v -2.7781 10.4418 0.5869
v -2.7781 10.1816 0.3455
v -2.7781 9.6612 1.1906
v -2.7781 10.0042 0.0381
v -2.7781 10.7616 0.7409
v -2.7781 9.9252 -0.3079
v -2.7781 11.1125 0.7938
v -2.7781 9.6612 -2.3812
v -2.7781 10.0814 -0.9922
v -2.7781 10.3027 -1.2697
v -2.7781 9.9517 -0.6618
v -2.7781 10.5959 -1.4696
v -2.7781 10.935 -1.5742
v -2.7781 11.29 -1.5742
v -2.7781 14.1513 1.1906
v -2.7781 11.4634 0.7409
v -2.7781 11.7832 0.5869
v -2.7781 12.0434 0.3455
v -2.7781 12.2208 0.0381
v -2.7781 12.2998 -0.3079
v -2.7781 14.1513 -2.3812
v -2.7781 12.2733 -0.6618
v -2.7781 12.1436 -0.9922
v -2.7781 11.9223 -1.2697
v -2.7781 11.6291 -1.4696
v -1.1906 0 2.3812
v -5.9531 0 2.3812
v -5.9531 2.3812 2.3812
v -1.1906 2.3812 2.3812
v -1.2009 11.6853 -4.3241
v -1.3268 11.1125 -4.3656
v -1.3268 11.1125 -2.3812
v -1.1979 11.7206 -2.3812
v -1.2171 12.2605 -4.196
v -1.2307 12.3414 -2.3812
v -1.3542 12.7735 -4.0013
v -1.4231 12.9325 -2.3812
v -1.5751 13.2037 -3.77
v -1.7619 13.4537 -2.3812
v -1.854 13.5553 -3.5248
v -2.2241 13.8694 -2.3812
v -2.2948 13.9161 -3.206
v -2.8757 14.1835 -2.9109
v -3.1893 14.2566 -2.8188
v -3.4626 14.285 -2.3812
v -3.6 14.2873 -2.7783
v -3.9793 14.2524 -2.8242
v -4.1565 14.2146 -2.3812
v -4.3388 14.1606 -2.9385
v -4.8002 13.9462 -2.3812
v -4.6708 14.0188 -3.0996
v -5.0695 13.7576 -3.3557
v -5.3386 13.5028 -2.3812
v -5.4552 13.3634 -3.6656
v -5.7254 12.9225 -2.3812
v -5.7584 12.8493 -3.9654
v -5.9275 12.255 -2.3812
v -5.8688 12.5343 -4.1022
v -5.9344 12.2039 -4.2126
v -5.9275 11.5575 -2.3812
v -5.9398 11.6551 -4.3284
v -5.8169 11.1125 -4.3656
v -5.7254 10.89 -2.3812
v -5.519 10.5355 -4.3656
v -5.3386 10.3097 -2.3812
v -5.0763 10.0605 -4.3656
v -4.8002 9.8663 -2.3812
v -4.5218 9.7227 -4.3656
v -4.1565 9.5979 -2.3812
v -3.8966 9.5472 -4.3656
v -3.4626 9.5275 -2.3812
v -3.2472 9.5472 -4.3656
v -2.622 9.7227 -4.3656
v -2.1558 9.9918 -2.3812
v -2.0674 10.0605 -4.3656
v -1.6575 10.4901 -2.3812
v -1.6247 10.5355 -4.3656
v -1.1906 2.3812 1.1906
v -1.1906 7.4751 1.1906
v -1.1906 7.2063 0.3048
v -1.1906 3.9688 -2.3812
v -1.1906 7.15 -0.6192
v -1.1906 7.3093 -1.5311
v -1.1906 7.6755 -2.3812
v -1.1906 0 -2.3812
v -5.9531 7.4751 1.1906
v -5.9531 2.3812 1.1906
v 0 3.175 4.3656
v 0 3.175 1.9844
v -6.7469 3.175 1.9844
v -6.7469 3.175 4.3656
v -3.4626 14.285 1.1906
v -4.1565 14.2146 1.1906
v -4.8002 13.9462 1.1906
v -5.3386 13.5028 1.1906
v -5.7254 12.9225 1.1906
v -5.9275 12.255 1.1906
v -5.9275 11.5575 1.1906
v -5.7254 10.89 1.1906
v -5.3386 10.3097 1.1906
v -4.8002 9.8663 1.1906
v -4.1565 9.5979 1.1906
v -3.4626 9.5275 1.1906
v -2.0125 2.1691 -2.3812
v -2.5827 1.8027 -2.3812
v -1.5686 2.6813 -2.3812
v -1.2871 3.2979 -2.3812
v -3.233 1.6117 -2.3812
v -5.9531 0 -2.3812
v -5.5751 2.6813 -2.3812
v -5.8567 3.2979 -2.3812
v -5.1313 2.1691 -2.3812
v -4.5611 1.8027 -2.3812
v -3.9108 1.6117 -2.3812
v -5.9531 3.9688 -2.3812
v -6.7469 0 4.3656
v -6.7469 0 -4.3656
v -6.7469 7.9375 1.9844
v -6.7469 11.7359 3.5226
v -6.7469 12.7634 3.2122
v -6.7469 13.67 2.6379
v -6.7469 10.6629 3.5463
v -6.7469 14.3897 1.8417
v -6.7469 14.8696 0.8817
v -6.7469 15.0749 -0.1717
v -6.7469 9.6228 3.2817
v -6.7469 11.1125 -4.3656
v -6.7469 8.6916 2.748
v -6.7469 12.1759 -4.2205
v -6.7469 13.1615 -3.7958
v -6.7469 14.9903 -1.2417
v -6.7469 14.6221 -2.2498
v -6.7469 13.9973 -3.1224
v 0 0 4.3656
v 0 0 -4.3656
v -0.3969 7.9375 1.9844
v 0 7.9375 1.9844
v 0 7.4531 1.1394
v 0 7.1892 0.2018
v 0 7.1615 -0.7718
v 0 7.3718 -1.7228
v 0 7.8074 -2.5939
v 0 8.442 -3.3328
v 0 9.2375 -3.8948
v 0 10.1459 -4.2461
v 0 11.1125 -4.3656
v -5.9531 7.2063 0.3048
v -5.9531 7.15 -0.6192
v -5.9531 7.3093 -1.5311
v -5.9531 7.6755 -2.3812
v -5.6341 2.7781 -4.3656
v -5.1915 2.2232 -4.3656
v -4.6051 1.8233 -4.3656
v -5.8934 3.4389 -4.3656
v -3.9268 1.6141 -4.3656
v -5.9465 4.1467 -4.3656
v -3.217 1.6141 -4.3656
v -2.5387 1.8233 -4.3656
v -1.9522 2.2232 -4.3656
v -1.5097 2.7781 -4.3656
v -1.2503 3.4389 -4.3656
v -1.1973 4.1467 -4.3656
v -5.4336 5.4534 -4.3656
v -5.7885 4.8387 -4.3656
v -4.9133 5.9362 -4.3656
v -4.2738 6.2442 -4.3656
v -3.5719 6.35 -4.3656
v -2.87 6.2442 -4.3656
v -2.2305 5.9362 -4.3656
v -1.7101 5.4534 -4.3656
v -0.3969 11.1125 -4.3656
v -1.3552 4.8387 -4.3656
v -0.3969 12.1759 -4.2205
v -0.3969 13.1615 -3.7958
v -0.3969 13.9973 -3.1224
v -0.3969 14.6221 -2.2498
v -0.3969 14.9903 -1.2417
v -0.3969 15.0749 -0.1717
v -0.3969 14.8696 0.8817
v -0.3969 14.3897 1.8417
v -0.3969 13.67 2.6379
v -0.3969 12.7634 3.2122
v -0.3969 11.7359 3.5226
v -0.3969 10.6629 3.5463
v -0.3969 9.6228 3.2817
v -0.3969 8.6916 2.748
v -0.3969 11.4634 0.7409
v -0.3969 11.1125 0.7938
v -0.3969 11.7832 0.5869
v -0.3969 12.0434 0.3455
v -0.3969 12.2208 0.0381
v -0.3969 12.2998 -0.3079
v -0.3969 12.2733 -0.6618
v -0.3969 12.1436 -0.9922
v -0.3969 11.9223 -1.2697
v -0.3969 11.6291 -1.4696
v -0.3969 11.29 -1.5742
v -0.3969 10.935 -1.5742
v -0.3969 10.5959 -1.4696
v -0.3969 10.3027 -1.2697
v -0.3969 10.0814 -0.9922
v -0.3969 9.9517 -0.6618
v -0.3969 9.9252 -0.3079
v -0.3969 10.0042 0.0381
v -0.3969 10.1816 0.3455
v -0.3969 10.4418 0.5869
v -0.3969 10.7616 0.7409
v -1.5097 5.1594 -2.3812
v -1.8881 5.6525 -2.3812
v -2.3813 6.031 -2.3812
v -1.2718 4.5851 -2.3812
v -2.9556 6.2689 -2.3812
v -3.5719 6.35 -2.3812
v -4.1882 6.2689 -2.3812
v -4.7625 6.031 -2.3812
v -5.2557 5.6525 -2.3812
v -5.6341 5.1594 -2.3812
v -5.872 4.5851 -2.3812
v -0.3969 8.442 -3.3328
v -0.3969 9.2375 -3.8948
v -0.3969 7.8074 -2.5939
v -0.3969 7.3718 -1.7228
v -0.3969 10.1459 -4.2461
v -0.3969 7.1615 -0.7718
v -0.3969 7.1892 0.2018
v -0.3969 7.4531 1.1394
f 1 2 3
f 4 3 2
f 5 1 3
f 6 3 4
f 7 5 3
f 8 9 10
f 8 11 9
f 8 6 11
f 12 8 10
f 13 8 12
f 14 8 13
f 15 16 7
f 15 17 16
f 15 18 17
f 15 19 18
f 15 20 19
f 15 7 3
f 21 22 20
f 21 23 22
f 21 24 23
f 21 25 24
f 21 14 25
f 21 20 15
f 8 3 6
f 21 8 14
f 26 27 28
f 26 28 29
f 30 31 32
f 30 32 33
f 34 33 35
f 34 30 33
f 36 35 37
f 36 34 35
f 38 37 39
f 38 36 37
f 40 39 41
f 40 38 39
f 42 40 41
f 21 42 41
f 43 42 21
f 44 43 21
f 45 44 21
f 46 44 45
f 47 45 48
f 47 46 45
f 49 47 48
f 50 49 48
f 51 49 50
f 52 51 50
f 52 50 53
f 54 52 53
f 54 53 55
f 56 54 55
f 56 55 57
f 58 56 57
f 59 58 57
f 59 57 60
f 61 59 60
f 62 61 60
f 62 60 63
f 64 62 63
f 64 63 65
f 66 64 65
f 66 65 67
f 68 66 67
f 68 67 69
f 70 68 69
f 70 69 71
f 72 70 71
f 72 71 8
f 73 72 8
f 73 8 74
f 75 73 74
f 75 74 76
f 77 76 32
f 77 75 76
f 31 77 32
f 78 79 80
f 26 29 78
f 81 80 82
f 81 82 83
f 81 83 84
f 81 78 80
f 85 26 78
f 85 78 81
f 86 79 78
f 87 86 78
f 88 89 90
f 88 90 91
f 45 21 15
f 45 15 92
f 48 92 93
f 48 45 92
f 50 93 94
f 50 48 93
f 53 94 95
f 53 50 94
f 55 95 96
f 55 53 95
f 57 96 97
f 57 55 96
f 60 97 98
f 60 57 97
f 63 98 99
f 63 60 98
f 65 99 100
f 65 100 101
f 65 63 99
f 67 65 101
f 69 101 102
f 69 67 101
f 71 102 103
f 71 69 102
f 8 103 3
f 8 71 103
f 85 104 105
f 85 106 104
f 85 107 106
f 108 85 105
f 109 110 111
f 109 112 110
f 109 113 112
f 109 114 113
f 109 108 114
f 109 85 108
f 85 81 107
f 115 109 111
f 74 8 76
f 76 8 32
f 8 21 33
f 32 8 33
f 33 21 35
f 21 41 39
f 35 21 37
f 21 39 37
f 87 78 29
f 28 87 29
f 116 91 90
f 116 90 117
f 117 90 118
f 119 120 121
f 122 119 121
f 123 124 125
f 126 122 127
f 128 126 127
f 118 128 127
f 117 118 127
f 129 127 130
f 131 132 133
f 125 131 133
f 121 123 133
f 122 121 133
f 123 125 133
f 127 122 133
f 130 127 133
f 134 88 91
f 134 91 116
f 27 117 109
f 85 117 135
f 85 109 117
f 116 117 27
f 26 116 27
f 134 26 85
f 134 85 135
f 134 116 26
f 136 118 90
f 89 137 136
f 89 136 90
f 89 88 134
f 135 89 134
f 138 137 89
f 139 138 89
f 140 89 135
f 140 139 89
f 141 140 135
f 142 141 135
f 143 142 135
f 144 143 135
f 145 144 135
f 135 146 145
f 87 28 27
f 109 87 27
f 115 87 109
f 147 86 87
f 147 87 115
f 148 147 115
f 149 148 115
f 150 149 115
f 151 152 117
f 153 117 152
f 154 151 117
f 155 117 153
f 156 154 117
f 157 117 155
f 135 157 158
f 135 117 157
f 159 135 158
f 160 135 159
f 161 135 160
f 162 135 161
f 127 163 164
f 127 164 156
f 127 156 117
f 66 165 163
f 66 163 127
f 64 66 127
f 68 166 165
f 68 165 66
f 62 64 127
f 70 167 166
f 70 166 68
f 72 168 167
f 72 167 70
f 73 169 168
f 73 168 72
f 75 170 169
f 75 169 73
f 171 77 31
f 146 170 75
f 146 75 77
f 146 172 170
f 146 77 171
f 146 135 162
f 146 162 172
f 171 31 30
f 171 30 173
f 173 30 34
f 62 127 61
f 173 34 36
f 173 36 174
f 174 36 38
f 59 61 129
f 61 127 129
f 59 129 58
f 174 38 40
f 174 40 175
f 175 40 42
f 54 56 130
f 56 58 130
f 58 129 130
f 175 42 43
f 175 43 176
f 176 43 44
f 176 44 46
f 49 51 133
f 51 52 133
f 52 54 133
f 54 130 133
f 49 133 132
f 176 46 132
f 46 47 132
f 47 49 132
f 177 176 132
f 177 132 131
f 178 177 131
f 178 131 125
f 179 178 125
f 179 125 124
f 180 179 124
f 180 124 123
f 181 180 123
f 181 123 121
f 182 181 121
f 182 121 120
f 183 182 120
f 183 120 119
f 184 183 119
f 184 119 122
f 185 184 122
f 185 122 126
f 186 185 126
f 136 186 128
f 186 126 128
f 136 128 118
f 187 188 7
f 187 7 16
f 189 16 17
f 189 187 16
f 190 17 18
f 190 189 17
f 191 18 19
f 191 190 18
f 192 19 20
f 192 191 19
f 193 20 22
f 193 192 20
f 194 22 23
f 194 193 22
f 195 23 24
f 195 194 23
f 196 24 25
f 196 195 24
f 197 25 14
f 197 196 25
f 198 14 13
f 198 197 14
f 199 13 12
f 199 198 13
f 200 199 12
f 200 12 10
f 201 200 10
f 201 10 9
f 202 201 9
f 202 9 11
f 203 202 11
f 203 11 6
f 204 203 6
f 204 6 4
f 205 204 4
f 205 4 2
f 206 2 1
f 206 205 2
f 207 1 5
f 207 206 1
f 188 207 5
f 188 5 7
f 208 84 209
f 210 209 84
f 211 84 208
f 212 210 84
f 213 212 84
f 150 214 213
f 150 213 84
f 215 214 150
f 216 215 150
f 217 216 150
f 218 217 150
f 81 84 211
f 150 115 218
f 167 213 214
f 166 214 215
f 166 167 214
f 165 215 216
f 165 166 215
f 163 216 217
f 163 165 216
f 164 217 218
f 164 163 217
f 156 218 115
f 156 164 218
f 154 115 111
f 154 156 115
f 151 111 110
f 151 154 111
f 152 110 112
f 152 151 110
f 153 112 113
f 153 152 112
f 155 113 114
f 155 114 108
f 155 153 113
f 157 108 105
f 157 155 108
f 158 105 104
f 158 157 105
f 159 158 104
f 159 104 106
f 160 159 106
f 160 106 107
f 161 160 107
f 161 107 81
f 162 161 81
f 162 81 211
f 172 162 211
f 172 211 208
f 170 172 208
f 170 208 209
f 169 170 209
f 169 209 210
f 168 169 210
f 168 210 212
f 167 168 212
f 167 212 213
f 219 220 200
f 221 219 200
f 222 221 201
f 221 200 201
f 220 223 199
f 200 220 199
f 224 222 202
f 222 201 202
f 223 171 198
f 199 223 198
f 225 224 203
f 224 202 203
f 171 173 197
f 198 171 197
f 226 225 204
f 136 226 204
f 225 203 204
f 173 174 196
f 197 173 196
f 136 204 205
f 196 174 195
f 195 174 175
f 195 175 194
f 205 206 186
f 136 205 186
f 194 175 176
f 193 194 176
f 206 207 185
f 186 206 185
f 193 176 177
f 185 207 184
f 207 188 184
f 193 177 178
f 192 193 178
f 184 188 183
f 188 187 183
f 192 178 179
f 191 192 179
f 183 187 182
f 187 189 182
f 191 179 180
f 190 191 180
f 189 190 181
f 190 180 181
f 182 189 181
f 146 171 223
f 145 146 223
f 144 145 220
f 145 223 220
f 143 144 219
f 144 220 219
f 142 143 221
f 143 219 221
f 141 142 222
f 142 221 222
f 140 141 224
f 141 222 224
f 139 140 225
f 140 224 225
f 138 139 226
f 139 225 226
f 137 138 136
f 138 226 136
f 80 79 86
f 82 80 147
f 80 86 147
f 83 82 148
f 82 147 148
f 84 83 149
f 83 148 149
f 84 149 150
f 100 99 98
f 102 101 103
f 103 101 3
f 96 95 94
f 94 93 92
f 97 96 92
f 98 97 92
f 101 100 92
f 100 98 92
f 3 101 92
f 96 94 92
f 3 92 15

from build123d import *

# Parameters (mm, degrees)
BOSS_EXTRUDE4_DEPTH  = 6.746875
SKETCH6_R            = 3.96875
BOSS_EXTRUDE5_DEPTH  = 6.746875
SHELL2_T             = -0.79375
BOSS_EXTRUDE6_REACH  = 19.089
CUT_EXTRUDE2_START   = -0.396875
SKETCH11_R           = 3.96875
CUT_EXTRUDE2_DEPTH   = 0.396875
SKETCH13_R           = 3.96875
BOSS_EXTRUDE11_DEPTH = 6.35
SKETCH14_R           = 2.38125
CUT_EXTRUDE3_DEPTH   = 1.984375
CUT_EXTRUDE4_DEPTH   = 3.571875
SKETCH17_R           = 1.190625
CUT_EXTRUDE5_DEPTH   = 2.38125
SKETCH18_W           = 8.89
SKETCH18_H           = 15.24
CUT_EXTRUDE6_DEPTH   = 12.7


with BuildPart() as part:
    # Sketch2 → Boss-Extrude4 (new body)
    with BuildSketch(Plane(origin=(0, 0, 0), x_dir=(0, 0, -1), z_dir=(1, 0, 0))):
        Polygon((-4.365625, 0), (4.365625, 0), (4.365625, 11.1125), (-1.984375, 11.1125), (-1.984375, 3.175), (-4.365625, 3.175), align=None)
    extrude(amount=BOSS_EXTRUDE4_DEPTH)

    # Sketch6 → Boss-Extrude5 (add)
    with BuildSketch(Plane(origin=(6.746875, 0, 0), x_dir=(0, 0, -1), z_dir=(1, 0, 0))):
        with Locations((0.396875, 11.1125)):
            Circle(SKETCH6_R)
    extrude(amount=-BOSS_EXTRUDE5_DEPTH)

    # Shell2
    shell2_openings = [part.faces().sort_by_distance(p)[0] for p in [
        (3.3734375, 0, 0),
    ]]
    offset(amount=SHELL2_T, openings=shell2_openings, kind=Kind.INTERSECTION)

    # Sketch7 → Boss-Extrude6 (add, up to next)
    with BuildSketch(Plane.XZ, mode=Mode.PRIVATE) as boss_extrude6_sk1:
        Polygon((5.953125, 3.571875), (5.953125, 2.38125), (1.190625, 2.38125), (1.190625, -2.38125), (5.953125, -2.38125), (5.953125, -3.571875), (0.79375, -3.571875), (0.79375, 3.571875), align=None)
    boss_extrude6_tool1 = extrude(boss_extrude6_sk1.sketch, amount=-BOSS_EXTRUDE6_REACH, mode=Mode.PRIVATE) - part.part
    add(boss_extrude6_tool1.solids().sort_by_distance((5.865004, 0, 2.976562))[0])

    # Sketch11 → Cut-Extrude2 (cut)
    with BuildSketch(Plane.ZY.offset(CUT_EXTRUDE2_START)):
        with Locations((-0.396875, 11.1125)):
            Circle(SKETCH11_R)
    extrude(amount=CUT_EXTRUDE2_DEPTH, mode=Mode.SUBTRACT)

    # Sketch13 → Boss-Extrude11 (add)
    with BuildSketch(Plane(origin=(6.746875, 0, 0), x_dir=(0, 0, -1), z_dir=(1, 0, 0))):
        with Locations((0.396875, 11.1125)):
            Circle(SKETCH13_R)
    extrude(amount=-BOSS_EXTRUDE11_DEPTH)

    # Sketch14 → Cut-Extrude3 (cut)
    with BuildSketch(Plane(origin=(0, 0, -4.365625), x_dir=(-1, 0, 0), z_dir=(0, 0, -1))):
        with Locations(Location((-3.571875, 3.96875, 0), (0, 0, 90))):
            Circle(SKETCH14_R)
        with Locations(Location((-3.571875, 11.90625, 0), (0, 0, 340.528779366))):
            Circle(SKETCH14_R)
    extrude(amount=-CUT_EXTRUDE3_DEPTH, mode=Mode.SUBTRACT)

    # Sketch16 → Cut-Extrude4 (cut)
    with BuildSketch(Plane(origin=(0, 0, -2.38125), x_dir=(-1, 0, 0), z_dir=(0, 0, -1))):
        with BuildLine():
            Line((-2.778125, 9.66118597), (-2.778125, 14.15131403))
            ThreePointArc((-2.778125, 14.15131403), (-5.953125, 11.90625), (-2.778125, 9.66118597))
        make_face()
    extrude(amount=-CUT_EXTRUDE4_DEPTH, mode=Mode.SUBTRACT)

    # Sketch17 → Cut-Extrude5 (cut)
    with BuildSketch(Plane.ZY.offset(-0.396875)):
        with Locations((-0.396875, 11.1125)):
            Circle(SKETCH17_R)
    extrude(amount=-CUT_EXTRUDE5_DEPTH, mode=Mode.SUBTRACT)

    # Mirror6: part across plane


with BuildPart() as part_1:
    add(part.part)
    add(part.part.mirror(Plane(origin=(0, 0, 0), x_dir=(0, 0, 1), z_dir=(1, 0, 0))))

    # Sketch18 → Cut-Extrude6 (cut)
    with BuildSketch(Plane(origin=(0, 0, 0), x_dir=(0, 0, -1), z_dir=(1, 0, 0))):
        with Locations((0.079375, 7.62)):
            Rectangle(SKETCH18_W, SKETCH18_H)
    extrude(amount=CUT_EXTRUDE6_DEPTH, mode=Mode.SUBTRACT)


solid = part_1.part
